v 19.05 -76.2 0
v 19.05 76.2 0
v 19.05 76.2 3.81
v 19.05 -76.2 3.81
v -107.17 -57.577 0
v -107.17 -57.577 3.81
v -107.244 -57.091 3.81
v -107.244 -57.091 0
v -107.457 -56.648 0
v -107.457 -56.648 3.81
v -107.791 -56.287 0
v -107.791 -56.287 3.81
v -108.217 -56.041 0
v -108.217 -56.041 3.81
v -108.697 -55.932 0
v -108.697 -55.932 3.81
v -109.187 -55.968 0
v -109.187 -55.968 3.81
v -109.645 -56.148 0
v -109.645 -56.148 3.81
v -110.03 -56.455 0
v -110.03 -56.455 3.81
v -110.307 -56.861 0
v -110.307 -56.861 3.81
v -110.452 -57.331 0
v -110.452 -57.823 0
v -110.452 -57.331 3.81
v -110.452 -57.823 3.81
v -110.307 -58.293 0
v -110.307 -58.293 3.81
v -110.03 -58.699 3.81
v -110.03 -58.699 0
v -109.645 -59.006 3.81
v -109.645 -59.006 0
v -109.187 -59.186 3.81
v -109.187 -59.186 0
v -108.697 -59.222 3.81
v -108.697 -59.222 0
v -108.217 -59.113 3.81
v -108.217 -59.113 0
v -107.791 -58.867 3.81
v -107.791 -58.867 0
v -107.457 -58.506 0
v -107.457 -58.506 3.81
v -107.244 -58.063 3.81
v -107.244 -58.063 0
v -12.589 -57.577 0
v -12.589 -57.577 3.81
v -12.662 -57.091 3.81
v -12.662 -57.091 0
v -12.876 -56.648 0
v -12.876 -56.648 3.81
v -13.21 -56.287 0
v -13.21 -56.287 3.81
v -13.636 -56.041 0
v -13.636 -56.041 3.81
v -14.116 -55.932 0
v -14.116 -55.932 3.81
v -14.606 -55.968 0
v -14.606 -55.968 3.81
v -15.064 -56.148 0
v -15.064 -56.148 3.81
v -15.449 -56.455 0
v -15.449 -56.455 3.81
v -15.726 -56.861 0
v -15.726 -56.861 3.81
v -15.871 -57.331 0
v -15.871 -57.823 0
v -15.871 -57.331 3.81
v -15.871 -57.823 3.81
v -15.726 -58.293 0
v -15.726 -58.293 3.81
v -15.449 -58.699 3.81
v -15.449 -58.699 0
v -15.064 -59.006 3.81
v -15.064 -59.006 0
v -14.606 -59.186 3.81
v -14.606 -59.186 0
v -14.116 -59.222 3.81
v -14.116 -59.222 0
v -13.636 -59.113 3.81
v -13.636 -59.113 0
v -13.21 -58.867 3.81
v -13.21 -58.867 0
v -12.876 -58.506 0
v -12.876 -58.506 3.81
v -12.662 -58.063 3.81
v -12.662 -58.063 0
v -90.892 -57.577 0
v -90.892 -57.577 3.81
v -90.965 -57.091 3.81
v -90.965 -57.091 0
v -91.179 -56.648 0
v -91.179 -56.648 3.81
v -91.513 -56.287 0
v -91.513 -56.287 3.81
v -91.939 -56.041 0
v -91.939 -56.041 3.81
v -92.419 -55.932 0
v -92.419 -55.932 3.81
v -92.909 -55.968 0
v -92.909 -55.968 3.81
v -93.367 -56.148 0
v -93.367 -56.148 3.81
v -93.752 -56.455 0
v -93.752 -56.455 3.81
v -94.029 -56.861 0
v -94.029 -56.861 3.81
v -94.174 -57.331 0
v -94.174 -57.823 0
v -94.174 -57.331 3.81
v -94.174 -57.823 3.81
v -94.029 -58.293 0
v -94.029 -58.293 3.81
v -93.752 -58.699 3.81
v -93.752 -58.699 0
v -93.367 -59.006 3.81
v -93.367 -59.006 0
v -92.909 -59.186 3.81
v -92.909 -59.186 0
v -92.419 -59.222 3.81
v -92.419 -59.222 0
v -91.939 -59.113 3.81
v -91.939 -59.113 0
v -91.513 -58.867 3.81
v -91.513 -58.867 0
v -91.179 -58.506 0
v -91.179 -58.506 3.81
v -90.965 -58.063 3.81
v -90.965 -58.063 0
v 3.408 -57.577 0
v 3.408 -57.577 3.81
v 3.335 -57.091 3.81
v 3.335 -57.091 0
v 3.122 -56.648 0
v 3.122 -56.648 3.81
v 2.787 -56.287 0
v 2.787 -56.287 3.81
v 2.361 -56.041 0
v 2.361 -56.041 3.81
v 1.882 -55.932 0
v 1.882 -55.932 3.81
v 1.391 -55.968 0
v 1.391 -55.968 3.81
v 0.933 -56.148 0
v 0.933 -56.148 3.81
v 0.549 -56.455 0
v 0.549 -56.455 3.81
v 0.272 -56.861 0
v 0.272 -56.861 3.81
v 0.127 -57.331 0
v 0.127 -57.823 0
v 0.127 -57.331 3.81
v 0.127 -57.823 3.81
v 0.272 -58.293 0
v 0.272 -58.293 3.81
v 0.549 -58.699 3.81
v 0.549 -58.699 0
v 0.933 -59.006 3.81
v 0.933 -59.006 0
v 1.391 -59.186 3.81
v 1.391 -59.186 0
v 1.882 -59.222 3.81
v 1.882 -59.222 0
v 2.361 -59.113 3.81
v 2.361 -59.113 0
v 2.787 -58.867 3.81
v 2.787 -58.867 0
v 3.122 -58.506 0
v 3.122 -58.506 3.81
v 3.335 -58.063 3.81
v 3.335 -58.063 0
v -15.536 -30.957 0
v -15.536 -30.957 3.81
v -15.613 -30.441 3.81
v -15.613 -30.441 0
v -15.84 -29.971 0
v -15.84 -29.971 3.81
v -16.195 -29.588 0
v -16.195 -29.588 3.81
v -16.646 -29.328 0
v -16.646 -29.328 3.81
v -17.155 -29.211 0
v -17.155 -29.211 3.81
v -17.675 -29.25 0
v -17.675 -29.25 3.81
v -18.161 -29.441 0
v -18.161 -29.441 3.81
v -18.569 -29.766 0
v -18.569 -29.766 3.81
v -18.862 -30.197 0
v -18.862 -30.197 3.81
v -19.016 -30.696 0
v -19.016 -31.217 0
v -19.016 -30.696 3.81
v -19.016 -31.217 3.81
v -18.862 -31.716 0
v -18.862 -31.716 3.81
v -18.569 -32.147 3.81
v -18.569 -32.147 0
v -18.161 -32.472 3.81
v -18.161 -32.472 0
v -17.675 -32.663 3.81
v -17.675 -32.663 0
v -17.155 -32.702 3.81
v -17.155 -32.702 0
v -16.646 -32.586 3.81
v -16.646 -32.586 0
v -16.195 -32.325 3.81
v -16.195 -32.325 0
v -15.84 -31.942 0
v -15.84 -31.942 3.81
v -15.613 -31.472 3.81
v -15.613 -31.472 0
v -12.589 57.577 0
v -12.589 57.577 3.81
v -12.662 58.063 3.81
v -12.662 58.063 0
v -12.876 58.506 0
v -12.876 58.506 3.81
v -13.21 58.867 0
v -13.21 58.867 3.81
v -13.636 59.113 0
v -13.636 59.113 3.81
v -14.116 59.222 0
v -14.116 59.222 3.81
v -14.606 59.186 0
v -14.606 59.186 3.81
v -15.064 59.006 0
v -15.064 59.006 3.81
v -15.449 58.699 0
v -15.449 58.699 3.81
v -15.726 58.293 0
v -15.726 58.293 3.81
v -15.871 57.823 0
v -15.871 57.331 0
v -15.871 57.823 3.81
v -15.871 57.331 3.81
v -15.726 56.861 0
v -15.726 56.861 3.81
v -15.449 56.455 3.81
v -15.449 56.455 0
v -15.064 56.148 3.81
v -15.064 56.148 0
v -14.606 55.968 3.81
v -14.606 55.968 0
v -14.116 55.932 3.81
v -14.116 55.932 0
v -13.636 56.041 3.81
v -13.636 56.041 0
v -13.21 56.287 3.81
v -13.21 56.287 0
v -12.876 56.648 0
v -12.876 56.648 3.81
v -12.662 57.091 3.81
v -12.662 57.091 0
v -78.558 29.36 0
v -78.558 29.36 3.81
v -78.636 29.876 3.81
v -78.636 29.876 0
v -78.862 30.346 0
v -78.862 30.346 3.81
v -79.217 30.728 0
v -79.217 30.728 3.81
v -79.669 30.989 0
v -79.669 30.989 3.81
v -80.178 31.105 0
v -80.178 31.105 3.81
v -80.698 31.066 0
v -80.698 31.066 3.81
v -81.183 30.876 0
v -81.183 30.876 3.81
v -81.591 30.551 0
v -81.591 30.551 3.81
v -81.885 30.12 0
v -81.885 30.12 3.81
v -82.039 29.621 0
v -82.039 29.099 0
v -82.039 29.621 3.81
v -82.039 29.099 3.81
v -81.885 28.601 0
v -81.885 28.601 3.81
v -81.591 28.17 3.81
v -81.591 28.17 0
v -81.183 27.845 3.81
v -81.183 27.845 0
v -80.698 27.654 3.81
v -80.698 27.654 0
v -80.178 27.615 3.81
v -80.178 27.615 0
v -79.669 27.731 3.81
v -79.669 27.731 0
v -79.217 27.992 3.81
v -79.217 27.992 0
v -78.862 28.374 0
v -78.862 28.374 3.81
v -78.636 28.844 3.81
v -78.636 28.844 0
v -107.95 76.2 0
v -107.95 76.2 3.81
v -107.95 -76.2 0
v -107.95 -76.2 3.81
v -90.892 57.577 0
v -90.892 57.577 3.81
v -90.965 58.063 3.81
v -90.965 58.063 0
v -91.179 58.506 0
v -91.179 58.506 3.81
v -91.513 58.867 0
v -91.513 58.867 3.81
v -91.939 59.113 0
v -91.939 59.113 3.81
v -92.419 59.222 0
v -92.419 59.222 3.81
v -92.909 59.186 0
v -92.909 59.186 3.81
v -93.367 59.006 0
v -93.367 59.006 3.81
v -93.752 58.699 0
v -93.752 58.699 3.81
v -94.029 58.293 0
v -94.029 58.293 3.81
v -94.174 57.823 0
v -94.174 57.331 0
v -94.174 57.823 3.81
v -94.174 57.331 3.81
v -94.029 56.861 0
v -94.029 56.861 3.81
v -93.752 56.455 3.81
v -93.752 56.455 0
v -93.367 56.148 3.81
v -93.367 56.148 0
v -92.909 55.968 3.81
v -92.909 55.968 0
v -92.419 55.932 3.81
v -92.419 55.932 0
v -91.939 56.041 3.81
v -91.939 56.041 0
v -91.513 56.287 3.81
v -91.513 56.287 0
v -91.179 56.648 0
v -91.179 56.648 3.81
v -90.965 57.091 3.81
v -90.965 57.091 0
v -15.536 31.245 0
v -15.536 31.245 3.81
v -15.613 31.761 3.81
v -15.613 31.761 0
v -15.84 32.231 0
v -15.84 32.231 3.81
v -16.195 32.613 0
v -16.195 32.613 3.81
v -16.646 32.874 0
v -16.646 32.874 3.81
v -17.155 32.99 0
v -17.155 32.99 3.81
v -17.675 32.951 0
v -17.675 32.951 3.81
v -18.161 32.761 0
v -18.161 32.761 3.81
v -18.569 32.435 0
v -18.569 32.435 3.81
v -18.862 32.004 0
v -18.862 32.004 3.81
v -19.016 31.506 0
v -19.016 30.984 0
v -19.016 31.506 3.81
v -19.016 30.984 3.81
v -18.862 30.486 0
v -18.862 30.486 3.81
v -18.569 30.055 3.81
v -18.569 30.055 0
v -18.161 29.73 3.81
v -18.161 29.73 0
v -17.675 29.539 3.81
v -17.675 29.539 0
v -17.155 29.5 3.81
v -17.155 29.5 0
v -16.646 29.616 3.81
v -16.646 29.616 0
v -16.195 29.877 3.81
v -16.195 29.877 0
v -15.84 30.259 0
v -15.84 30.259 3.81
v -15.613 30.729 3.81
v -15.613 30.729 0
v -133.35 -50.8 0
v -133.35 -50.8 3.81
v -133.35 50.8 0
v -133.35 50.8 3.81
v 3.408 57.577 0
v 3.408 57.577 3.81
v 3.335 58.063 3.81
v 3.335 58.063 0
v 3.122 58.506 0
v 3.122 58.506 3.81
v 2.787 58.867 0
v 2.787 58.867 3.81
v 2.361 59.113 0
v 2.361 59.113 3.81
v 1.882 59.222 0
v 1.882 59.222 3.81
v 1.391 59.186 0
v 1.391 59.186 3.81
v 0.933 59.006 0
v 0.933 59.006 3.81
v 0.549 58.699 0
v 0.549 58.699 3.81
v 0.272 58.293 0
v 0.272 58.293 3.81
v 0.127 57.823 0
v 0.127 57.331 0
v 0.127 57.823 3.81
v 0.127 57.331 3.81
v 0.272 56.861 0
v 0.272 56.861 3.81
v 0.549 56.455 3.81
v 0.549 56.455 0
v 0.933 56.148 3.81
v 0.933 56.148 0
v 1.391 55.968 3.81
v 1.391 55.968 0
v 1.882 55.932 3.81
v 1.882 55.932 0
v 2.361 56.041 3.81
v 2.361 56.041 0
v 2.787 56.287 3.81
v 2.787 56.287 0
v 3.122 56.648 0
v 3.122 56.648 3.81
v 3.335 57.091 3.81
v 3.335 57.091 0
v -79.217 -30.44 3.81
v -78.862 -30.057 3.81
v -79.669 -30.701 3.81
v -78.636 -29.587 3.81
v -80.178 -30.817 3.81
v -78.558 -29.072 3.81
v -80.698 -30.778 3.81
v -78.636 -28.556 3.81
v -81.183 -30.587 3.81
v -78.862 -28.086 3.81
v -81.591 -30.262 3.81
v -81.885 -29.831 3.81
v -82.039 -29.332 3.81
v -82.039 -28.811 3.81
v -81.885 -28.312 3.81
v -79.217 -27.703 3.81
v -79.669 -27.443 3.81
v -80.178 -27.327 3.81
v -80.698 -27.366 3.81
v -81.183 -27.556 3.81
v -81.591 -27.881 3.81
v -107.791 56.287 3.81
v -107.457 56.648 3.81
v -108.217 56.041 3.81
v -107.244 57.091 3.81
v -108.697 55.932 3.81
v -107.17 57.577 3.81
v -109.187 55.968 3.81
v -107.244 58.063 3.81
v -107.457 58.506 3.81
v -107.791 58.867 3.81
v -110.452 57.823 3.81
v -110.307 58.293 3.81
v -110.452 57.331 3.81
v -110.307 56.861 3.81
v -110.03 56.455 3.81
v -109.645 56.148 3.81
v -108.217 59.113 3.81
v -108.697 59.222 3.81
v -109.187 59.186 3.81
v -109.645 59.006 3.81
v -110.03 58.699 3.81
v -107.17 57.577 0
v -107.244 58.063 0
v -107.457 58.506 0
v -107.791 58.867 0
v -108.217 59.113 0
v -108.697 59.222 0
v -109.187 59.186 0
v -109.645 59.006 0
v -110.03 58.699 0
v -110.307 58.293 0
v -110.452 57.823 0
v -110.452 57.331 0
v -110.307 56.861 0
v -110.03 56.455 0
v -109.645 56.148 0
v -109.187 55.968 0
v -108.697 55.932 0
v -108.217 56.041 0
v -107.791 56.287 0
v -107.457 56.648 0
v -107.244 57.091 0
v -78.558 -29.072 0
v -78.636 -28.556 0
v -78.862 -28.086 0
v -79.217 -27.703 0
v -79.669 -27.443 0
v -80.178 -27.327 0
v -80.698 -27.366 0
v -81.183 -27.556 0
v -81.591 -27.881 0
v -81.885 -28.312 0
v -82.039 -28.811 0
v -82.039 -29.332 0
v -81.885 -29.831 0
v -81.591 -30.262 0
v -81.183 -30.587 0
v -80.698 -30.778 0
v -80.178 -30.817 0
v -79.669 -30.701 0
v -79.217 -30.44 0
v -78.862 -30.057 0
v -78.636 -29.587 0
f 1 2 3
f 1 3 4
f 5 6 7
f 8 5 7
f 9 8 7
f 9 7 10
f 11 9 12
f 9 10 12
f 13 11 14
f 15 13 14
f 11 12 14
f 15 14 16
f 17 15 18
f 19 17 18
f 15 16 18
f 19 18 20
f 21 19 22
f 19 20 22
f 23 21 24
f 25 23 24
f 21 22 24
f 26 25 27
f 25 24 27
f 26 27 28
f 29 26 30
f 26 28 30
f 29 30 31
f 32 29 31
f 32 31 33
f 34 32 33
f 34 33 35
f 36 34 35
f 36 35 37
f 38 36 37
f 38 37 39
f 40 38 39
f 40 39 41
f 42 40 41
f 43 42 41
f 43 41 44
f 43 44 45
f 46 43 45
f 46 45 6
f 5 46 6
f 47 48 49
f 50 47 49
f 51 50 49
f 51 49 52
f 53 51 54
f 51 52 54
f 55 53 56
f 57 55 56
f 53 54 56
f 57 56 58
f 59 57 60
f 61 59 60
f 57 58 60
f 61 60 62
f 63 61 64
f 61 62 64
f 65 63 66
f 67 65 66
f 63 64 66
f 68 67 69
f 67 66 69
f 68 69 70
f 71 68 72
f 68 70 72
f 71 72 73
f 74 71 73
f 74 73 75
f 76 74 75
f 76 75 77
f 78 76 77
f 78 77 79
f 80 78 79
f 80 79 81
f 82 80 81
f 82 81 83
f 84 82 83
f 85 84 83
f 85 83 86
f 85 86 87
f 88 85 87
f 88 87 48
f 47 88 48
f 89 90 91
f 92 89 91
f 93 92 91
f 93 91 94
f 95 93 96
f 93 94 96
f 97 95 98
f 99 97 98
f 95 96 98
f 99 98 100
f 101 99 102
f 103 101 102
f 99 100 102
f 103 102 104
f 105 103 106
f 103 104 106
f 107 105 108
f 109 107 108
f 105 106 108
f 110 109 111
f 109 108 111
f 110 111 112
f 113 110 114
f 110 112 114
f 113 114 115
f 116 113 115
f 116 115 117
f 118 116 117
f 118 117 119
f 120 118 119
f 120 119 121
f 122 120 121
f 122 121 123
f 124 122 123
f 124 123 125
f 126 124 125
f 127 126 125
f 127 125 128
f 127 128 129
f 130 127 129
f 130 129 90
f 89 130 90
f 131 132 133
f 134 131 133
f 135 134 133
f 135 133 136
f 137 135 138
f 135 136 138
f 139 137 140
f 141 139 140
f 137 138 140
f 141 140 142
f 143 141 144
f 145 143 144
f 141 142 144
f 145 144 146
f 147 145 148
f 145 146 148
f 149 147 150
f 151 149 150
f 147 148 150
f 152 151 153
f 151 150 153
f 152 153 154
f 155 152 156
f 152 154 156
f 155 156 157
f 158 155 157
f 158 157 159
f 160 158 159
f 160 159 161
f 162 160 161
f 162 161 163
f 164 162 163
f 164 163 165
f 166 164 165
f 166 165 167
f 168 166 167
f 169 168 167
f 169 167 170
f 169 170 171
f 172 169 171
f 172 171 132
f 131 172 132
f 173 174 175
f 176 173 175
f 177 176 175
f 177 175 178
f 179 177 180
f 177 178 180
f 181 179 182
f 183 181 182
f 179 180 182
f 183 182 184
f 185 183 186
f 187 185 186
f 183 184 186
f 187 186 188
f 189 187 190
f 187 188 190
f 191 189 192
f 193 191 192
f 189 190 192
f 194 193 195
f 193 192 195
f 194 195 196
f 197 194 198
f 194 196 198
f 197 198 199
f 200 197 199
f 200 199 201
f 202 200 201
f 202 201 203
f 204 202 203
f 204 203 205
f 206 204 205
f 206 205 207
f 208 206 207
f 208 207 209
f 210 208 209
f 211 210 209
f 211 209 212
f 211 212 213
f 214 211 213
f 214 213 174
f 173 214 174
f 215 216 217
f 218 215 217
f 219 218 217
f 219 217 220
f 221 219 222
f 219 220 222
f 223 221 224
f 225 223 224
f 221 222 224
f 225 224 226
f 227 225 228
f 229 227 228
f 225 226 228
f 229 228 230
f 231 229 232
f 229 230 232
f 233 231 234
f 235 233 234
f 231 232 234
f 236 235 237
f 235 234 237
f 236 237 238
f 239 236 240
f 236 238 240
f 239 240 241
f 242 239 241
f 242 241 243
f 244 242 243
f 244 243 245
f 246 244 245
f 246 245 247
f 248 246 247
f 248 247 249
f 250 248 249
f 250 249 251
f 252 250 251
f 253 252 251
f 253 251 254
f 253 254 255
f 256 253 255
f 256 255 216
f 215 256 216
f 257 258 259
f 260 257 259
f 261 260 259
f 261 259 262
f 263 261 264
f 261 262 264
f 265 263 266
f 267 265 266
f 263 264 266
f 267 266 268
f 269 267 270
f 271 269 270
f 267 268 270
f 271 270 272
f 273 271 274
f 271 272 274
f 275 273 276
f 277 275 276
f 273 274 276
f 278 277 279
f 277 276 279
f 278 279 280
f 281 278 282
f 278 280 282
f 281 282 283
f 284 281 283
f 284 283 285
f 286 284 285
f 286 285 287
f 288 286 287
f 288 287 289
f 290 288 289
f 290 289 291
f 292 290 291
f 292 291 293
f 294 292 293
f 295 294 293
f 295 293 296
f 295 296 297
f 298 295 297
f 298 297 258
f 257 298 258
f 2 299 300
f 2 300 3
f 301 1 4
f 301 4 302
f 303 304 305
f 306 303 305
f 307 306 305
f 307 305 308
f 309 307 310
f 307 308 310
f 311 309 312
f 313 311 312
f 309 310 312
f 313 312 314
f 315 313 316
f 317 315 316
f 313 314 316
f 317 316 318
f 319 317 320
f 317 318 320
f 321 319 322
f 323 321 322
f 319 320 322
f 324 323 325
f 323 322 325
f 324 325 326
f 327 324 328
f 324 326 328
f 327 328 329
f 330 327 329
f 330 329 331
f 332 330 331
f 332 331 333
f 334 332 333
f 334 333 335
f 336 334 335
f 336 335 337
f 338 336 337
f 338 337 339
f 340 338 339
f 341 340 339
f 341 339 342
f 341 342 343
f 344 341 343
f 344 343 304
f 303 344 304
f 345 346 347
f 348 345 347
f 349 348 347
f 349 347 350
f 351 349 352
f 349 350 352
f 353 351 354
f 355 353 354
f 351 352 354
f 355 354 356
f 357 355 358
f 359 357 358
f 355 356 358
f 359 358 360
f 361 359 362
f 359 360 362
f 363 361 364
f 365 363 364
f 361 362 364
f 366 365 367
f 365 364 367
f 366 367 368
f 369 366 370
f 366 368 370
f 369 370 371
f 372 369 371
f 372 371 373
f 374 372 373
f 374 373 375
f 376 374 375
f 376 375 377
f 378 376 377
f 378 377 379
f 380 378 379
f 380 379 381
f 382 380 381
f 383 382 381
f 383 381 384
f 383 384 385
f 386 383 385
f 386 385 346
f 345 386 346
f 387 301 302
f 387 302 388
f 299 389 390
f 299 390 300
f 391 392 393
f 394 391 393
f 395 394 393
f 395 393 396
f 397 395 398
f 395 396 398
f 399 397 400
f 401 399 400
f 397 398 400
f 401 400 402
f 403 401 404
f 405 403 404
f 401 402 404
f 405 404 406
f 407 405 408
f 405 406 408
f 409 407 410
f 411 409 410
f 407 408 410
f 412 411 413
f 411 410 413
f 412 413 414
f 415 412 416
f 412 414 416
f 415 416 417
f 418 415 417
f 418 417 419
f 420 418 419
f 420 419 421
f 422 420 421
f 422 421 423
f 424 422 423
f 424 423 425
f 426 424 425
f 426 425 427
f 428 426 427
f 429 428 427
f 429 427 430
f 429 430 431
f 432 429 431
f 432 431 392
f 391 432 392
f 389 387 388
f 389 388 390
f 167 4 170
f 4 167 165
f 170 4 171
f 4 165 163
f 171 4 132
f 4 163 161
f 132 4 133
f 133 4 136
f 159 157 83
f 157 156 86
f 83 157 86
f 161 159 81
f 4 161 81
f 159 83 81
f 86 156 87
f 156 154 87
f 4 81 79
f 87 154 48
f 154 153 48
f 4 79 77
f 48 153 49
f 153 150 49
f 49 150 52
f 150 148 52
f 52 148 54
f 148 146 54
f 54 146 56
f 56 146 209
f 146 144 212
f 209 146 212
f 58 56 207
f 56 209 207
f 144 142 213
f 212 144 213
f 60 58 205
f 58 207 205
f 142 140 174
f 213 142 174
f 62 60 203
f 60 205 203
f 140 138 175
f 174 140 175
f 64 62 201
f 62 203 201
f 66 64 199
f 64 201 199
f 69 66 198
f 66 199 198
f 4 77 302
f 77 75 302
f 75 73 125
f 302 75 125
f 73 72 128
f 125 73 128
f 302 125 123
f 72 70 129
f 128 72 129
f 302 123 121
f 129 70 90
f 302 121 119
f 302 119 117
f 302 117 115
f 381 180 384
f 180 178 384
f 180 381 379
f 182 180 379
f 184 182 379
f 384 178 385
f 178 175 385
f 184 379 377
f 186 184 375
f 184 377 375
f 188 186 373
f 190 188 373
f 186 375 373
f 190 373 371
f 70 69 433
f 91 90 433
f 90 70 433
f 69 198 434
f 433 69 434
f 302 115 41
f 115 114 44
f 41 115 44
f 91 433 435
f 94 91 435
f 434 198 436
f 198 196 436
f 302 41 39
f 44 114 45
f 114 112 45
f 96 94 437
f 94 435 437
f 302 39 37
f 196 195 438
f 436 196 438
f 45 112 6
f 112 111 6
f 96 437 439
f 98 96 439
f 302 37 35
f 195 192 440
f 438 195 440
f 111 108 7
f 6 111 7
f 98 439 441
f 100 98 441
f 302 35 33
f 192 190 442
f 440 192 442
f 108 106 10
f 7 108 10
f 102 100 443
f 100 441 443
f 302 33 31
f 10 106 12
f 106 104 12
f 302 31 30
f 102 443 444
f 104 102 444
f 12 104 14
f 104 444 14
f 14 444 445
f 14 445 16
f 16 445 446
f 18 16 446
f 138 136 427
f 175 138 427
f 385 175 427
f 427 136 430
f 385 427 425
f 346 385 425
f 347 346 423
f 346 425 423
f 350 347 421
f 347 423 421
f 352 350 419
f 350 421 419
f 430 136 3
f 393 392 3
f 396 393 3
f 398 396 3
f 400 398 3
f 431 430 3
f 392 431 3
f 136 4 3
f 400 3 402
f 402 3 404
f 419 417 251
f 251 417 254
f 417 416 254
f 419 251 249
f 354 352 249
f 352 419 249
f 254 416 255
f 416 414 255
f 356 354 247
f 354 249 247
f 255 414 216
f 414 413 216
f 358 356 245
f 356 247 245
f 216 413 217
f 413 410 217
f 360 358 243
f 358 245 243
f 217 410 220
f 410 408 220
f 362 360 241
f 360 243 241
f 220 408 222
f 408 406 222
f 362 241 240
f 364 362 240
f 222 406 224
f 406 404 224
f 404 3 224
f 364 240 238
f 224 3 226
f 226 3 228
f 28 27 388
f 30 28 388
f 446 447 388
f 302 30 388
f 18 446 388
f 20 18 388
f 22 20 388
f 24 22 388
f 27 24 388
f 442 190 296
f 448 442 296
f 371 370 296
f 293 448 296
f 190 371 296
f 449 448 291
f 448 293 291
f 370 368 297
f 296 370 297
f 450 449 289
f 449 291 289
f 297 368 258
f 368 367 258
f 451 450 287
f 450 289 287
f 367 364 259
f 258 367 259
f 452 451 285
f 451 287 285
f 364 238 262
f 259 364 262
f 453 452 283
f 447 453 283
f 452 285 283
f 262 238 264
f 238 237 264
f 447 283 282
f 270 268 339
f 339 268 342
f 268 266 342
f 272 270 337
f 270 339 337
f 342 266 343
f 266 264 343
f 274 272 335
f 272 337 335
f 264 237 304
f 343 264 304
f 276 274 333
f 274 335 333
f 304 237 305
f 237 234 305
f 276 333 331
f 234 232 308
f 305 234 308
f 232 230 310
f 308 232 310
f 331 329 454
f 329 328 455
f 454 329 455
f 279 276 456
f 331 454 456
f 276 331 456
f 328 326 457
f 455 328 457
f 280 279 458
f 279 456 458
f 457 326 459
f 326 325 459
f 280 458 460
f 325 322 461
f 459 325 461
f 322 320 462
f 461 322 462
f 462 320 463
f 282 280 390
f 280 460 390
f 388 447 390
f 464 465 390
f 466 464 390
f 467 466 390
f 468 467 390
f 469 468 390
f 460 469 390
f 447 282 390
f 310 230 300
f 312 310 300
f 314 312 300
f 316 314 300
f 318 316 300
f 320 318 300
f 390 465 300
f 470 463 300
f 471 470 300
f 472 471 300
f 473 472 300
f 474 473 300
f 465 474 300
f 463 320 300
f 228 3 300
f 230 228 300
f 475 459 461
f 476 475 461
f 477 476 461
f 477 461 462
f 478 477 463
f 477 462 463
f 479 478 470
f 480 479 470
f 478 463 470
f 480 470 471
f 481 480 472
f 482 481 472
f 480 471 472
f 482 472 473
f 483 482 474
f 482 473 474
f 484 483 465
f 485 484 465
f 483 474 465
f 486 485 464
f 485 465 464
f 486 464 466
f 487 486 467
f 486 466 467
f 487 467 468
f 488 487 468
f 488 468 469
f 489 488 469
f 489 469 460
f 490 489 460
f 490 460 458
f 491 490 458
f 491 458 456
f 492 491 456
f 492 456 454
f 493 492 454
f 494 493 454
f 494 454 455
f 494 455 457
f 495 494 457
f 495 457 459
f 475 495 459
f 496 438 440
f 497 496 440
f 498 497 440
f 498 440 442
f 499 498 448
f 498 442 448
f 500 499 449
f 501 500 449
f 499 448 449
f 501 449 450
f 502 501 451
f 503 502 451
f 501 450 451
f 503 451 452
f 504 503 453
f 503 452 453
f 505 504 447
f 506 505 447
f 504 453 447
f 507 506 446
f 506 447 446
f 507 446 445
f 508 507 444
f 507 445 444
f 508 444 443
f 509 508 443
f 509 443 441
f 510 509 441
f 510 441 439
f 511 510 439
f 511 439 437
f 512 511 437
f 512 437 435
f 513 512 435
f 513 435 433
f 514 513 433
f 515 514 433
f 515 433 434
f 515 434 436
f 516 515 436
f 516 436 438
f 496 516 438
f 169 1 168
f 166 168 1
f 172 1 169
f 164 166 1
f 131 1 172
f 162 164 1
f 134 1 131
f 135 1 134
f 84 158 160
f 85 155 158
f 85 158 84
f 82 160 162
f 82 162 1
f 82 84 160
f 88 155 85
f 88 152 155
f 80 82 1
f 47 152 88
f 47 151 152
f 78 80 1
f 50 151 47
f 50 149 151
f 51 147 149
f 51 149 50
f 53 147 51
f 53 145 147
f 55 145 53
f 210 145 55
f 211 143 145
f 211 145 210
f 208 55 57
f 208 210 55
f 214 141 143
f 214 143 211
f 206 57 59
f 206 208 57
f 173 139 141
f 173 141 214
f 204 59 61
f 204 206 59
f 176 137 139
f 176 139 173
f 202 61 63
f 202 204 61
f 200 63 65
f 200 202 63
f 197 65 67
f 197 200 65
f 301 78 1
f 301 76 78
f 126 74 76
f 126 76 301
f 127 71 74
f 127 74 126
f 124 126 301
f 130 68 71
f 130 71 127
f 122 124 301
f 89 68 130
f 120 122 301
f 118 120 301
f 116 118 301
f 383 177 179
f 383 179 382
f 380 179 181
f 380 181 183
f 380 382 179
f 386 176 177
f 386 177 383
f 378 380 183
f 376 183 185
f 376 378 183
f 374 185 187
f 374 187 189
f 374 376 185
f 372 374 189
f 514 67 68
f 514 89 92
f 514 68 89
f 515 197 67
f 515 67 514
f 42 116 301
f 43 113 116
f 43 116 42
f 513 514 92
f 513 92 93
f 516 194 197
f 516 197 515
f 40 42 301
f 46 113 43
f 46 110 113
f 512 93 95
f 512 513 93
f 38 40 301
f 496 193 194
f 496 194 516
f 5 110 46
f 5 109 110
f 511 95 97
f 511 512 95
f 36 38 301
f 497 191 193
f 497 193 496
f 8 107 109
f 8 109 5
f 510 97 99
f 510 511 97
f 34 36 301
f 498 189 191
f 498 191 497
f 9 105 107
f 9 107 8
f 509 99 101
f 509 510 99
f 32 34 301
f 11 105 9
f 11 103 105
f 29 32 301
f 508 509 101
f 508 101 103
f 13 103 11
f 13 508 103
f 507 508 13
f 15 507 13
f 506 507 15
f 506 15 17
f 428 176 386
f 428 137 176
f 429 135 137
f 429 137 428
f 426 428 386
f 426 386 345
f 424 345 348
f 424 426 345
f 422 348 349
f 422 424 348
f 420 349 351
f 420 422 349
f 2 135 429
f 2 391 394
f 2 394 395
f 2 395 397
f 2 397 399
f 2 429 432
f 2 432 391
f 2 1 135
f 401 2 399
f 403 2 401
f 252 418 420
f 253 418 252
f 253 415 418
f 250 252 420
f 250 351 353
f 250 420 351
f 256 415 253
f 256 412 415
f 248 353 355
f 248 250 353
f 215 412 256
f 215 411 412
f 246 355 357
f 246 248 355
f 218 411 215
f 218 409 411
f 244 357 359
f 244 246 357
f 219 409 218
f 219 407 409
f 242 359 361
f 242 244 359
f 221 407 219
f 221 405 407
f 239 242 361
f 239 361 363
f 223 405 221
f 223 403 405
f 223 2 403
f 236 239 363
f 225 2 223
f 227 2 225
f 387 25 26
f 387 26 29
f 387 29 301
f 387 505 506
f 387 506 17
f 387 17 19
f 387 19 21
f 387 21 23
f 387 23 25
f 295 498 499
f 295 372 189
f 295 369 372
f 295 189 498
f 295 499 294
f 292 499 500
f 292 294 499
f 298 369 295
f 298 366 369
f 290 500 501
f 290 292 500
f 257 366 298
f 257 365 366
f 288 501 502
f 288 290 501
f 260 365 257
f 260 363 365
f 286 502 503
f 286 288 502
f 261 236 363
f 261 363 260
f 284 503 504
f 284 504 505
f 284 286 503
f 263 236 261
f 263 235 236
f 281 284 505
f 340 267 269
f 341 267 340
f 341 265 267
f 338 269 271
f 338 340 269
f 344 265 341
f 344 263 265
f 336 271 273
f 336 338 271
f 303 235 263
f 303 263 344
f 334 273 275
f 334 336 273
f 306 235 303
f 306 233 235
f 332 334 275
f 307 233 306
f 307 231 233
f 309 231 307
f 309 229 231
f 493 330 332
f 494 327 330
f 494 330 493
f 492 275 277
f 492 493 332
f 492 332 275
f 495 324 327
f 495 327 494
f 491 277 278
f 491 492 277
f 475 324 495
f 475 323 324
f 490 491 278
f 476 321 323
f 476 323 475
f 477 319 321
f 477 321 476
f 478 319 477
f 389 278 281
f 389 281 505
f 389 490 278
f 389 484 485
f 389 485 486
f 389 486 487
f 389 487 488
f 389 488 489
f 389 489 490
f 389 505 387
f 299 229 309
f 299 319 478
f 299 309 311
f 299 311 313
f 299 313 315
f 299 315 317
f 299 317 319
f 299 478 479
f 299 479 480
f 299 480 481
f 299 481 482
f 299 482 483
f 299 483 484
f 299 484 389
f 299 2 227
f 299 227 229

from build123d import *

# Parameters (mm, degrees)
BOSS_EXTRUDE1_DEPTH = 3.81
SKETCH2_R           = 1.65
CUT_EXTRUDE1_DEPTH  = 8.89
SKETCH3_R           = 1.75
CUT_EXTRUDE2_DEPTH  = 154.633260071


with BuildPart() as part:
    # Sketch1 → Boss-Extrude1 (new body)
    with BuildSketch(Plane.XY):
        Polygon((-107.95, -76.2), (-133.35, -50.8), (-133.35, 50.8), (-107.95, 76.2), (19.05, 76.2), (19.05, -76.2), align=None)
    extrude(amount=BOSS_EXTRUDE1_DEPTH)

    # Sketch2 → Cut-Extrude1 (cut)
    with BuildSketch(Plane.XY.offset(3.81)):
        with Locations((1.75833287, 57.577017073)):
            Circle(SKETCH2_R)
        with Locations((-14.239074115, 57.577017073)):
            Circle(SKETCH2_R)
        with Locations((-92.542171462, 57.577017073)):
            Circle(SKETCH2_R)
        with Locations((-108.82023471, 57.577017073)):
            Circle(SKETCH2_R)
        with Locations((-108.82023471, -57.577017073)):
            Circle(SKETCH2_R)
        with Locations((-92.542171462, -57.577017073)):
            Circle(SKETCH2_R)
        with Locations((-14.239074115, -57.577017073)):
            Circle(SKETCH2_R)
        with Locations((1.75833287, -57.577017073)):
            Circle(SKETCH2_R)
    extrude(amount=-CUT_EXTRUDE1_DEPTH, mode=Mode.SUBTRACT)

    # Sketch3 → Cut-Extrude2 (cut, through all)
    with BuildSketch(Plane.XY.offset(3.81)):
        with Locations((-80.308350336, 29.360206552)):
            Circle(SKETCH3_R)
        with Locations((-17.285686927, 31.245112915)):
            Circle(SKETCH3_R)
        with Locations((-17.285686927, -30.956551268)):
            Circle(SKETCH3_R)
        with Locations((-80.308350336, -29.071644905)):
            Circle(SKETCH3_R)
    extrude(amount=-CUT_EXTRUDE2_DEPTH, mode=Mode.SUBTRACT)


solid = part.part
